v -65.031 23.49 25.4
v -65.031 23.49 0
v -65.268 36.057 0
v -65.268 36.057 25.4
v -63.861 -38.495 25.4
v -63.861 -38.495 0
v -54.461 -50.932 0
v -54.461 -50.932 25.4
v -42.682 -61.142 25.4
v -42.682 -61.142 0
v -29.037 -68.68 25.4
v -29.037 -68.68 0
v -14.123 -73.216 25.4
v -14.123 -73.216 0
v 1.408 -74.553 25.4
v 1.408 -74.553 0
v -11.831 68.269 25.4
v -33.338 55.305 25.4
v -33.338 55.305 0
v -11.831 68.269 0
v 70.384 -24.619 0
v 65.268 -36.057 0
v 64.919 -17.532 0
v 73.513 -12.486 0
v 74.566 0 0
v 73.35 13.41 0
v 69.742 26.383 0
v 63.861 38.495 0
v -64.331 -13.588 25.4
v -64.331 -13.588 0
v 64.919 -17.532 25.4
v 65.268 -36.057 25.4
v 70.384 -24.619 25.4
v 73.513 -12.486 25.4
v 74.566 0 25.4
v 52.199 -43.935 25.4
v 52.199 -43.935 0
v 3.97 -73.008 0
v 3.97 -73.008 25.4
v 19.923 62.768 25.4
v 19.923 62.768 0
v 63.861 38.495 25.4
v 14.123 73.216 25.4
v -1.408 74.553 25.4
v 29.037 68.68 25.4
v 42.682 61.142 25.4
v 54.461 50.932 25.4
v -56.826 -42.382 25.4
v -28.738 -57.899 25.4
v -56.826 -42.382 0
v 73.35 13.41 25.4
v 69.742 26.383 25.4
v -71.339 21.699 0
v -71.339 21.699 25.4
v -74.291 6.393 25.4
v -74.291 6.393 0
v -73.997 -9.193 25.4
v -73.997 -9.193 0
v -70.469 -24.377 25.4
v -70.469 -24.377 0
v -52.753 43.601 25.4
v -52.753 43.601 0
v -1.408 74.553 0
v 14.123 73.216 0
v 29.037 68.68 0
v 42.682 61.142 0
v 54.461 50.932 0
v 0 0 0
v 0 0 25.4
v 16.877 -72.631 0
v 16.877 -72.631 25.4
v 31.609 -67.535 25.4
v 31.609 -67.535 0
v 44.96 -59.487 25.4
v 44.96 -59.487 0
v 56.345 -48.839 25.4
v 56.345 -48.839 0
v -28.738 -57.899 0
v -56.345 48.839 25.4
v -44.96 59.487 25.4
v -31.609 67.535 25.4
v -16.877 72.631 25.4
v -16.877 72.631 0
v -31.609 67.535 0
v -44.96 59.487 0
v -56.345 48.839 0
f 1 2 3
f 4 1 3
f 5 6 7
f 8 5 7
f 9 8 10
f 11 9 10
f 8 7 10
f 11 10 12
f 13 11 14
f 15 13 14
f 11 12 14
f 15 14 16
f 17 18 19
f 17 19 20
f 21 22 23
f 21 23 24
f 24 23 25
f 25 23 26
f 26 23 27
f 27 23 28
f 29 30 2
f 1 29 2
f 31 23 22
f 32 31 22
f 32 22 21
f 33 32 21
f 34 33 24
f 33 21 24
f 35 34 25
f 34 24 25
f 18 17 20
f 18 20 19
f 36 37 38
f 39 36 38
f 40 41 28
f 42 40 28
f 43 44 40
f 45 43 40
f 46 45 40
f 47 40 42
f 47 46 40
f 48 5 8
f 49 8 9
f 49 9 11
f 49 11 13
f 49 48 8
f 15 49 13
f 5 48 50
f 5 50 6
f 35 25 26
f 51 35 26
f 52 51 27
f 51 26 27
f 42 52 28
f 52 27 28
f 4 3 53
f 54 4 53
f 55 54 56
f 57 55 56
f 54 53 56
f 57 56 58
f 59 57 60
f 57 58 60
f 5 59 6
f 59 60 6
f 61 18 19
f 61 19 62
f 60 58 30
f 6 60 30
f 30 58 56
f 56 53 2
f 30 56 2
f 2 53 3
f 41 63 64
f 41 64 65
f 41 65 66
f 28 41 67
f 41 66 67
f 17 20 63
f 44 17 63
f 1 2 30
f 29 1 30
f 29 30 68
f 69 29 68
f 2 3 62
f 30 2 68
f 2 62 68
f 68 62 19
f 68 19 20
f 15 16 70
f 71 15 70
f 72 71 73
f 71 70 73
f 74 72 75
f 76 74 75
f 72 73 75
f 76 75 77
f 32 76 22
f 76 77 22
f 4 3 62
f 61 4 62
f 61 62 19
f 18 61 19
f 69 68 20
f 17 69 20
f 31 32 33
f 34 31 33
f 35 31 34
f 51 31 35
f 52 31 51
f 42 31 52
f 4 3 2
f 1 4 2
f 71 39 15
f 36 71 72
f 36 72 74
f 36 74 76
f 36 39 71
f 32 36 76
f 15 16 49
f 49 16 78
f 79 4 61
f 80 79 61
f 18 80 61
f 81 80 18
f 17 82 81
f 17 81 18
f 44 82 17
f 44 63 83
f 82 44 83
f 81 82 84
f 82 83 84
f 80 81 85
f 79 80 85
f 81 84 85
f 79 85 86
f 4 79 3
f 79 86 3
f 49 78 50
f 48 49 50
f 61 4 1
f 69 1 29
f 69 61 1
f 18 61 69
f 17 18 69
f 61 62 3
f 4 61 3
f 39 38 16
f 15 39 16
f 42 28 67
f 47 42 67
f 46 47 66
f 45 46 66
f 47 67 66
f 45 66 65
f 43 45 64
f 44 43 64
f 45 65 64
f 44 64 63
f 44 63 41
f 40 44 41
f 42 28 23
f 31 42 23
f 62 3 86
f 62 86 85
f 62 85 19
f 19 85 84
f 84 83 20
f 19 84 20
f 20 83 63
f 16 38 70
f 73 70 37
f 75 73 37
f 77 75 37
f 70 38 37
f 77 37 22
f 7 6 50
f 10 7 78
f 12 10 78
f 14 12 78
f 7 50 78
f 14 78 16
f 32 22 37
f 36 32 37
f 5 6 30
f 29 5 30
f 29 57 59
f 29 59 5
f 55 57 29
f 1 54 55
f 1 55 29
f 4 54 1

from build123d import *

# Parameters (mm, degrees)
F1_DEPTH = 25.4
F2_DEPTH = 25.4


with BuildPart() as f1:
    # F0 (on Top) → F1 (new body)
    with BuildSketch(Plane.XY):
        with BuildLine():
            ThreePointArc((65.268345, -36.057142), (72.204112, -18.618285), (74.565906, 0))
            ThreePointArc((74.565906, 0), (71.839738, 19.978148), (63.860574, 38.495474))
            Line((63.860574, 38.495474), (64.91854, -17.532217))
            Line((64.91854, -17.532217), (65.268345, -36.057142))
        make_face()
        with BuildLine():
            Line((19.923109, 62.768487), (63.860574, 38.495474))
            ThreePointArc((63.860574, 38.495474), (36.057142, 65.268345), (-1.407772, 74.552616))
            Line((-1.407772, 74.552616), (19.923109, 62.768487))
        make_face()
        with BuildLine():
            Line((-11.831469, 68.269159), (-1.407772, 74.552616))
            ThreePointArc((-1.407772, 74.552616), (-38.495474, 63.860574), (-65.268345, 36.057142))
            Line((-65.268345, 36.057142), (-52.753322, 43.60126))
            Line((-52.753322, 43.60126), (-33.338058, 55.304879))
            Line((-33.338058, 55.304879), (-11.831469, 68.269159))
        make_face()
        with BuildLine():
            ThreePointArc((-63.860574, -38.495474), (-36.057142, -65.268345), (1.407772, -74.552616))
            Line((1.407772, -74.552616), (-28.737855, -57.898829))
            Line((-28.737855, -57.898829), (-56.825633, -42.381889))
            Line((-56.825633, -42.381889), (-63.860574, -38.495474))
        make_face()
        with BuildLine():
            ThreePointArc((1.407772, -74.552616), (38.495474, -63.860574), (65.268345, -36.057142))
            Line((65.268345, -36.057142), (52.199426, -43.935152))
            Line((52.199426, -43.935152), (3.969514, -73.008385))
            Line((3.969514, -73.008385), (1.407772, -74.552616))
        make_face()
        with BuildLine():
            Line((-65.031041, 23.490025), (-65.268345, 36.057142))
            ThreePointArc((-65.268345, 36.057142), (-74.552616, -1.407772), (-63.860574, -38.495474))
            Line((-63.860574, -38.495474), (-64.330896, -13.588211))
            Line((-64.330896, -13.588211), (-65.031041, 23.490025))
        make_face()
    extrude(amount=F1_DEPTH)


with BuildPart() as f2:
    # F0 (on Top) → F2 (new body)
    with BuildSketch(Plane.XY):
        Polygon((-33.338058, 55.304879), (0, 0), (-11.831469, 68.269159), align=None)
        Polygon((-52.753322, 43.60126), (0, 0), (-33.338058, 55.304879), align=None)
        Polygon((-65.031041, 23.490025), (0, 0), (-52.753322, 43.60126), (-65.268345, 36.057142), align=None)
        Polygon((-64.330896, -13.588211), (0, 0), (-65.031041, 23.490025), align=None)
    extrude(amount=F2_DEPTH)


solid = Compound([f1.part, f2.part])
